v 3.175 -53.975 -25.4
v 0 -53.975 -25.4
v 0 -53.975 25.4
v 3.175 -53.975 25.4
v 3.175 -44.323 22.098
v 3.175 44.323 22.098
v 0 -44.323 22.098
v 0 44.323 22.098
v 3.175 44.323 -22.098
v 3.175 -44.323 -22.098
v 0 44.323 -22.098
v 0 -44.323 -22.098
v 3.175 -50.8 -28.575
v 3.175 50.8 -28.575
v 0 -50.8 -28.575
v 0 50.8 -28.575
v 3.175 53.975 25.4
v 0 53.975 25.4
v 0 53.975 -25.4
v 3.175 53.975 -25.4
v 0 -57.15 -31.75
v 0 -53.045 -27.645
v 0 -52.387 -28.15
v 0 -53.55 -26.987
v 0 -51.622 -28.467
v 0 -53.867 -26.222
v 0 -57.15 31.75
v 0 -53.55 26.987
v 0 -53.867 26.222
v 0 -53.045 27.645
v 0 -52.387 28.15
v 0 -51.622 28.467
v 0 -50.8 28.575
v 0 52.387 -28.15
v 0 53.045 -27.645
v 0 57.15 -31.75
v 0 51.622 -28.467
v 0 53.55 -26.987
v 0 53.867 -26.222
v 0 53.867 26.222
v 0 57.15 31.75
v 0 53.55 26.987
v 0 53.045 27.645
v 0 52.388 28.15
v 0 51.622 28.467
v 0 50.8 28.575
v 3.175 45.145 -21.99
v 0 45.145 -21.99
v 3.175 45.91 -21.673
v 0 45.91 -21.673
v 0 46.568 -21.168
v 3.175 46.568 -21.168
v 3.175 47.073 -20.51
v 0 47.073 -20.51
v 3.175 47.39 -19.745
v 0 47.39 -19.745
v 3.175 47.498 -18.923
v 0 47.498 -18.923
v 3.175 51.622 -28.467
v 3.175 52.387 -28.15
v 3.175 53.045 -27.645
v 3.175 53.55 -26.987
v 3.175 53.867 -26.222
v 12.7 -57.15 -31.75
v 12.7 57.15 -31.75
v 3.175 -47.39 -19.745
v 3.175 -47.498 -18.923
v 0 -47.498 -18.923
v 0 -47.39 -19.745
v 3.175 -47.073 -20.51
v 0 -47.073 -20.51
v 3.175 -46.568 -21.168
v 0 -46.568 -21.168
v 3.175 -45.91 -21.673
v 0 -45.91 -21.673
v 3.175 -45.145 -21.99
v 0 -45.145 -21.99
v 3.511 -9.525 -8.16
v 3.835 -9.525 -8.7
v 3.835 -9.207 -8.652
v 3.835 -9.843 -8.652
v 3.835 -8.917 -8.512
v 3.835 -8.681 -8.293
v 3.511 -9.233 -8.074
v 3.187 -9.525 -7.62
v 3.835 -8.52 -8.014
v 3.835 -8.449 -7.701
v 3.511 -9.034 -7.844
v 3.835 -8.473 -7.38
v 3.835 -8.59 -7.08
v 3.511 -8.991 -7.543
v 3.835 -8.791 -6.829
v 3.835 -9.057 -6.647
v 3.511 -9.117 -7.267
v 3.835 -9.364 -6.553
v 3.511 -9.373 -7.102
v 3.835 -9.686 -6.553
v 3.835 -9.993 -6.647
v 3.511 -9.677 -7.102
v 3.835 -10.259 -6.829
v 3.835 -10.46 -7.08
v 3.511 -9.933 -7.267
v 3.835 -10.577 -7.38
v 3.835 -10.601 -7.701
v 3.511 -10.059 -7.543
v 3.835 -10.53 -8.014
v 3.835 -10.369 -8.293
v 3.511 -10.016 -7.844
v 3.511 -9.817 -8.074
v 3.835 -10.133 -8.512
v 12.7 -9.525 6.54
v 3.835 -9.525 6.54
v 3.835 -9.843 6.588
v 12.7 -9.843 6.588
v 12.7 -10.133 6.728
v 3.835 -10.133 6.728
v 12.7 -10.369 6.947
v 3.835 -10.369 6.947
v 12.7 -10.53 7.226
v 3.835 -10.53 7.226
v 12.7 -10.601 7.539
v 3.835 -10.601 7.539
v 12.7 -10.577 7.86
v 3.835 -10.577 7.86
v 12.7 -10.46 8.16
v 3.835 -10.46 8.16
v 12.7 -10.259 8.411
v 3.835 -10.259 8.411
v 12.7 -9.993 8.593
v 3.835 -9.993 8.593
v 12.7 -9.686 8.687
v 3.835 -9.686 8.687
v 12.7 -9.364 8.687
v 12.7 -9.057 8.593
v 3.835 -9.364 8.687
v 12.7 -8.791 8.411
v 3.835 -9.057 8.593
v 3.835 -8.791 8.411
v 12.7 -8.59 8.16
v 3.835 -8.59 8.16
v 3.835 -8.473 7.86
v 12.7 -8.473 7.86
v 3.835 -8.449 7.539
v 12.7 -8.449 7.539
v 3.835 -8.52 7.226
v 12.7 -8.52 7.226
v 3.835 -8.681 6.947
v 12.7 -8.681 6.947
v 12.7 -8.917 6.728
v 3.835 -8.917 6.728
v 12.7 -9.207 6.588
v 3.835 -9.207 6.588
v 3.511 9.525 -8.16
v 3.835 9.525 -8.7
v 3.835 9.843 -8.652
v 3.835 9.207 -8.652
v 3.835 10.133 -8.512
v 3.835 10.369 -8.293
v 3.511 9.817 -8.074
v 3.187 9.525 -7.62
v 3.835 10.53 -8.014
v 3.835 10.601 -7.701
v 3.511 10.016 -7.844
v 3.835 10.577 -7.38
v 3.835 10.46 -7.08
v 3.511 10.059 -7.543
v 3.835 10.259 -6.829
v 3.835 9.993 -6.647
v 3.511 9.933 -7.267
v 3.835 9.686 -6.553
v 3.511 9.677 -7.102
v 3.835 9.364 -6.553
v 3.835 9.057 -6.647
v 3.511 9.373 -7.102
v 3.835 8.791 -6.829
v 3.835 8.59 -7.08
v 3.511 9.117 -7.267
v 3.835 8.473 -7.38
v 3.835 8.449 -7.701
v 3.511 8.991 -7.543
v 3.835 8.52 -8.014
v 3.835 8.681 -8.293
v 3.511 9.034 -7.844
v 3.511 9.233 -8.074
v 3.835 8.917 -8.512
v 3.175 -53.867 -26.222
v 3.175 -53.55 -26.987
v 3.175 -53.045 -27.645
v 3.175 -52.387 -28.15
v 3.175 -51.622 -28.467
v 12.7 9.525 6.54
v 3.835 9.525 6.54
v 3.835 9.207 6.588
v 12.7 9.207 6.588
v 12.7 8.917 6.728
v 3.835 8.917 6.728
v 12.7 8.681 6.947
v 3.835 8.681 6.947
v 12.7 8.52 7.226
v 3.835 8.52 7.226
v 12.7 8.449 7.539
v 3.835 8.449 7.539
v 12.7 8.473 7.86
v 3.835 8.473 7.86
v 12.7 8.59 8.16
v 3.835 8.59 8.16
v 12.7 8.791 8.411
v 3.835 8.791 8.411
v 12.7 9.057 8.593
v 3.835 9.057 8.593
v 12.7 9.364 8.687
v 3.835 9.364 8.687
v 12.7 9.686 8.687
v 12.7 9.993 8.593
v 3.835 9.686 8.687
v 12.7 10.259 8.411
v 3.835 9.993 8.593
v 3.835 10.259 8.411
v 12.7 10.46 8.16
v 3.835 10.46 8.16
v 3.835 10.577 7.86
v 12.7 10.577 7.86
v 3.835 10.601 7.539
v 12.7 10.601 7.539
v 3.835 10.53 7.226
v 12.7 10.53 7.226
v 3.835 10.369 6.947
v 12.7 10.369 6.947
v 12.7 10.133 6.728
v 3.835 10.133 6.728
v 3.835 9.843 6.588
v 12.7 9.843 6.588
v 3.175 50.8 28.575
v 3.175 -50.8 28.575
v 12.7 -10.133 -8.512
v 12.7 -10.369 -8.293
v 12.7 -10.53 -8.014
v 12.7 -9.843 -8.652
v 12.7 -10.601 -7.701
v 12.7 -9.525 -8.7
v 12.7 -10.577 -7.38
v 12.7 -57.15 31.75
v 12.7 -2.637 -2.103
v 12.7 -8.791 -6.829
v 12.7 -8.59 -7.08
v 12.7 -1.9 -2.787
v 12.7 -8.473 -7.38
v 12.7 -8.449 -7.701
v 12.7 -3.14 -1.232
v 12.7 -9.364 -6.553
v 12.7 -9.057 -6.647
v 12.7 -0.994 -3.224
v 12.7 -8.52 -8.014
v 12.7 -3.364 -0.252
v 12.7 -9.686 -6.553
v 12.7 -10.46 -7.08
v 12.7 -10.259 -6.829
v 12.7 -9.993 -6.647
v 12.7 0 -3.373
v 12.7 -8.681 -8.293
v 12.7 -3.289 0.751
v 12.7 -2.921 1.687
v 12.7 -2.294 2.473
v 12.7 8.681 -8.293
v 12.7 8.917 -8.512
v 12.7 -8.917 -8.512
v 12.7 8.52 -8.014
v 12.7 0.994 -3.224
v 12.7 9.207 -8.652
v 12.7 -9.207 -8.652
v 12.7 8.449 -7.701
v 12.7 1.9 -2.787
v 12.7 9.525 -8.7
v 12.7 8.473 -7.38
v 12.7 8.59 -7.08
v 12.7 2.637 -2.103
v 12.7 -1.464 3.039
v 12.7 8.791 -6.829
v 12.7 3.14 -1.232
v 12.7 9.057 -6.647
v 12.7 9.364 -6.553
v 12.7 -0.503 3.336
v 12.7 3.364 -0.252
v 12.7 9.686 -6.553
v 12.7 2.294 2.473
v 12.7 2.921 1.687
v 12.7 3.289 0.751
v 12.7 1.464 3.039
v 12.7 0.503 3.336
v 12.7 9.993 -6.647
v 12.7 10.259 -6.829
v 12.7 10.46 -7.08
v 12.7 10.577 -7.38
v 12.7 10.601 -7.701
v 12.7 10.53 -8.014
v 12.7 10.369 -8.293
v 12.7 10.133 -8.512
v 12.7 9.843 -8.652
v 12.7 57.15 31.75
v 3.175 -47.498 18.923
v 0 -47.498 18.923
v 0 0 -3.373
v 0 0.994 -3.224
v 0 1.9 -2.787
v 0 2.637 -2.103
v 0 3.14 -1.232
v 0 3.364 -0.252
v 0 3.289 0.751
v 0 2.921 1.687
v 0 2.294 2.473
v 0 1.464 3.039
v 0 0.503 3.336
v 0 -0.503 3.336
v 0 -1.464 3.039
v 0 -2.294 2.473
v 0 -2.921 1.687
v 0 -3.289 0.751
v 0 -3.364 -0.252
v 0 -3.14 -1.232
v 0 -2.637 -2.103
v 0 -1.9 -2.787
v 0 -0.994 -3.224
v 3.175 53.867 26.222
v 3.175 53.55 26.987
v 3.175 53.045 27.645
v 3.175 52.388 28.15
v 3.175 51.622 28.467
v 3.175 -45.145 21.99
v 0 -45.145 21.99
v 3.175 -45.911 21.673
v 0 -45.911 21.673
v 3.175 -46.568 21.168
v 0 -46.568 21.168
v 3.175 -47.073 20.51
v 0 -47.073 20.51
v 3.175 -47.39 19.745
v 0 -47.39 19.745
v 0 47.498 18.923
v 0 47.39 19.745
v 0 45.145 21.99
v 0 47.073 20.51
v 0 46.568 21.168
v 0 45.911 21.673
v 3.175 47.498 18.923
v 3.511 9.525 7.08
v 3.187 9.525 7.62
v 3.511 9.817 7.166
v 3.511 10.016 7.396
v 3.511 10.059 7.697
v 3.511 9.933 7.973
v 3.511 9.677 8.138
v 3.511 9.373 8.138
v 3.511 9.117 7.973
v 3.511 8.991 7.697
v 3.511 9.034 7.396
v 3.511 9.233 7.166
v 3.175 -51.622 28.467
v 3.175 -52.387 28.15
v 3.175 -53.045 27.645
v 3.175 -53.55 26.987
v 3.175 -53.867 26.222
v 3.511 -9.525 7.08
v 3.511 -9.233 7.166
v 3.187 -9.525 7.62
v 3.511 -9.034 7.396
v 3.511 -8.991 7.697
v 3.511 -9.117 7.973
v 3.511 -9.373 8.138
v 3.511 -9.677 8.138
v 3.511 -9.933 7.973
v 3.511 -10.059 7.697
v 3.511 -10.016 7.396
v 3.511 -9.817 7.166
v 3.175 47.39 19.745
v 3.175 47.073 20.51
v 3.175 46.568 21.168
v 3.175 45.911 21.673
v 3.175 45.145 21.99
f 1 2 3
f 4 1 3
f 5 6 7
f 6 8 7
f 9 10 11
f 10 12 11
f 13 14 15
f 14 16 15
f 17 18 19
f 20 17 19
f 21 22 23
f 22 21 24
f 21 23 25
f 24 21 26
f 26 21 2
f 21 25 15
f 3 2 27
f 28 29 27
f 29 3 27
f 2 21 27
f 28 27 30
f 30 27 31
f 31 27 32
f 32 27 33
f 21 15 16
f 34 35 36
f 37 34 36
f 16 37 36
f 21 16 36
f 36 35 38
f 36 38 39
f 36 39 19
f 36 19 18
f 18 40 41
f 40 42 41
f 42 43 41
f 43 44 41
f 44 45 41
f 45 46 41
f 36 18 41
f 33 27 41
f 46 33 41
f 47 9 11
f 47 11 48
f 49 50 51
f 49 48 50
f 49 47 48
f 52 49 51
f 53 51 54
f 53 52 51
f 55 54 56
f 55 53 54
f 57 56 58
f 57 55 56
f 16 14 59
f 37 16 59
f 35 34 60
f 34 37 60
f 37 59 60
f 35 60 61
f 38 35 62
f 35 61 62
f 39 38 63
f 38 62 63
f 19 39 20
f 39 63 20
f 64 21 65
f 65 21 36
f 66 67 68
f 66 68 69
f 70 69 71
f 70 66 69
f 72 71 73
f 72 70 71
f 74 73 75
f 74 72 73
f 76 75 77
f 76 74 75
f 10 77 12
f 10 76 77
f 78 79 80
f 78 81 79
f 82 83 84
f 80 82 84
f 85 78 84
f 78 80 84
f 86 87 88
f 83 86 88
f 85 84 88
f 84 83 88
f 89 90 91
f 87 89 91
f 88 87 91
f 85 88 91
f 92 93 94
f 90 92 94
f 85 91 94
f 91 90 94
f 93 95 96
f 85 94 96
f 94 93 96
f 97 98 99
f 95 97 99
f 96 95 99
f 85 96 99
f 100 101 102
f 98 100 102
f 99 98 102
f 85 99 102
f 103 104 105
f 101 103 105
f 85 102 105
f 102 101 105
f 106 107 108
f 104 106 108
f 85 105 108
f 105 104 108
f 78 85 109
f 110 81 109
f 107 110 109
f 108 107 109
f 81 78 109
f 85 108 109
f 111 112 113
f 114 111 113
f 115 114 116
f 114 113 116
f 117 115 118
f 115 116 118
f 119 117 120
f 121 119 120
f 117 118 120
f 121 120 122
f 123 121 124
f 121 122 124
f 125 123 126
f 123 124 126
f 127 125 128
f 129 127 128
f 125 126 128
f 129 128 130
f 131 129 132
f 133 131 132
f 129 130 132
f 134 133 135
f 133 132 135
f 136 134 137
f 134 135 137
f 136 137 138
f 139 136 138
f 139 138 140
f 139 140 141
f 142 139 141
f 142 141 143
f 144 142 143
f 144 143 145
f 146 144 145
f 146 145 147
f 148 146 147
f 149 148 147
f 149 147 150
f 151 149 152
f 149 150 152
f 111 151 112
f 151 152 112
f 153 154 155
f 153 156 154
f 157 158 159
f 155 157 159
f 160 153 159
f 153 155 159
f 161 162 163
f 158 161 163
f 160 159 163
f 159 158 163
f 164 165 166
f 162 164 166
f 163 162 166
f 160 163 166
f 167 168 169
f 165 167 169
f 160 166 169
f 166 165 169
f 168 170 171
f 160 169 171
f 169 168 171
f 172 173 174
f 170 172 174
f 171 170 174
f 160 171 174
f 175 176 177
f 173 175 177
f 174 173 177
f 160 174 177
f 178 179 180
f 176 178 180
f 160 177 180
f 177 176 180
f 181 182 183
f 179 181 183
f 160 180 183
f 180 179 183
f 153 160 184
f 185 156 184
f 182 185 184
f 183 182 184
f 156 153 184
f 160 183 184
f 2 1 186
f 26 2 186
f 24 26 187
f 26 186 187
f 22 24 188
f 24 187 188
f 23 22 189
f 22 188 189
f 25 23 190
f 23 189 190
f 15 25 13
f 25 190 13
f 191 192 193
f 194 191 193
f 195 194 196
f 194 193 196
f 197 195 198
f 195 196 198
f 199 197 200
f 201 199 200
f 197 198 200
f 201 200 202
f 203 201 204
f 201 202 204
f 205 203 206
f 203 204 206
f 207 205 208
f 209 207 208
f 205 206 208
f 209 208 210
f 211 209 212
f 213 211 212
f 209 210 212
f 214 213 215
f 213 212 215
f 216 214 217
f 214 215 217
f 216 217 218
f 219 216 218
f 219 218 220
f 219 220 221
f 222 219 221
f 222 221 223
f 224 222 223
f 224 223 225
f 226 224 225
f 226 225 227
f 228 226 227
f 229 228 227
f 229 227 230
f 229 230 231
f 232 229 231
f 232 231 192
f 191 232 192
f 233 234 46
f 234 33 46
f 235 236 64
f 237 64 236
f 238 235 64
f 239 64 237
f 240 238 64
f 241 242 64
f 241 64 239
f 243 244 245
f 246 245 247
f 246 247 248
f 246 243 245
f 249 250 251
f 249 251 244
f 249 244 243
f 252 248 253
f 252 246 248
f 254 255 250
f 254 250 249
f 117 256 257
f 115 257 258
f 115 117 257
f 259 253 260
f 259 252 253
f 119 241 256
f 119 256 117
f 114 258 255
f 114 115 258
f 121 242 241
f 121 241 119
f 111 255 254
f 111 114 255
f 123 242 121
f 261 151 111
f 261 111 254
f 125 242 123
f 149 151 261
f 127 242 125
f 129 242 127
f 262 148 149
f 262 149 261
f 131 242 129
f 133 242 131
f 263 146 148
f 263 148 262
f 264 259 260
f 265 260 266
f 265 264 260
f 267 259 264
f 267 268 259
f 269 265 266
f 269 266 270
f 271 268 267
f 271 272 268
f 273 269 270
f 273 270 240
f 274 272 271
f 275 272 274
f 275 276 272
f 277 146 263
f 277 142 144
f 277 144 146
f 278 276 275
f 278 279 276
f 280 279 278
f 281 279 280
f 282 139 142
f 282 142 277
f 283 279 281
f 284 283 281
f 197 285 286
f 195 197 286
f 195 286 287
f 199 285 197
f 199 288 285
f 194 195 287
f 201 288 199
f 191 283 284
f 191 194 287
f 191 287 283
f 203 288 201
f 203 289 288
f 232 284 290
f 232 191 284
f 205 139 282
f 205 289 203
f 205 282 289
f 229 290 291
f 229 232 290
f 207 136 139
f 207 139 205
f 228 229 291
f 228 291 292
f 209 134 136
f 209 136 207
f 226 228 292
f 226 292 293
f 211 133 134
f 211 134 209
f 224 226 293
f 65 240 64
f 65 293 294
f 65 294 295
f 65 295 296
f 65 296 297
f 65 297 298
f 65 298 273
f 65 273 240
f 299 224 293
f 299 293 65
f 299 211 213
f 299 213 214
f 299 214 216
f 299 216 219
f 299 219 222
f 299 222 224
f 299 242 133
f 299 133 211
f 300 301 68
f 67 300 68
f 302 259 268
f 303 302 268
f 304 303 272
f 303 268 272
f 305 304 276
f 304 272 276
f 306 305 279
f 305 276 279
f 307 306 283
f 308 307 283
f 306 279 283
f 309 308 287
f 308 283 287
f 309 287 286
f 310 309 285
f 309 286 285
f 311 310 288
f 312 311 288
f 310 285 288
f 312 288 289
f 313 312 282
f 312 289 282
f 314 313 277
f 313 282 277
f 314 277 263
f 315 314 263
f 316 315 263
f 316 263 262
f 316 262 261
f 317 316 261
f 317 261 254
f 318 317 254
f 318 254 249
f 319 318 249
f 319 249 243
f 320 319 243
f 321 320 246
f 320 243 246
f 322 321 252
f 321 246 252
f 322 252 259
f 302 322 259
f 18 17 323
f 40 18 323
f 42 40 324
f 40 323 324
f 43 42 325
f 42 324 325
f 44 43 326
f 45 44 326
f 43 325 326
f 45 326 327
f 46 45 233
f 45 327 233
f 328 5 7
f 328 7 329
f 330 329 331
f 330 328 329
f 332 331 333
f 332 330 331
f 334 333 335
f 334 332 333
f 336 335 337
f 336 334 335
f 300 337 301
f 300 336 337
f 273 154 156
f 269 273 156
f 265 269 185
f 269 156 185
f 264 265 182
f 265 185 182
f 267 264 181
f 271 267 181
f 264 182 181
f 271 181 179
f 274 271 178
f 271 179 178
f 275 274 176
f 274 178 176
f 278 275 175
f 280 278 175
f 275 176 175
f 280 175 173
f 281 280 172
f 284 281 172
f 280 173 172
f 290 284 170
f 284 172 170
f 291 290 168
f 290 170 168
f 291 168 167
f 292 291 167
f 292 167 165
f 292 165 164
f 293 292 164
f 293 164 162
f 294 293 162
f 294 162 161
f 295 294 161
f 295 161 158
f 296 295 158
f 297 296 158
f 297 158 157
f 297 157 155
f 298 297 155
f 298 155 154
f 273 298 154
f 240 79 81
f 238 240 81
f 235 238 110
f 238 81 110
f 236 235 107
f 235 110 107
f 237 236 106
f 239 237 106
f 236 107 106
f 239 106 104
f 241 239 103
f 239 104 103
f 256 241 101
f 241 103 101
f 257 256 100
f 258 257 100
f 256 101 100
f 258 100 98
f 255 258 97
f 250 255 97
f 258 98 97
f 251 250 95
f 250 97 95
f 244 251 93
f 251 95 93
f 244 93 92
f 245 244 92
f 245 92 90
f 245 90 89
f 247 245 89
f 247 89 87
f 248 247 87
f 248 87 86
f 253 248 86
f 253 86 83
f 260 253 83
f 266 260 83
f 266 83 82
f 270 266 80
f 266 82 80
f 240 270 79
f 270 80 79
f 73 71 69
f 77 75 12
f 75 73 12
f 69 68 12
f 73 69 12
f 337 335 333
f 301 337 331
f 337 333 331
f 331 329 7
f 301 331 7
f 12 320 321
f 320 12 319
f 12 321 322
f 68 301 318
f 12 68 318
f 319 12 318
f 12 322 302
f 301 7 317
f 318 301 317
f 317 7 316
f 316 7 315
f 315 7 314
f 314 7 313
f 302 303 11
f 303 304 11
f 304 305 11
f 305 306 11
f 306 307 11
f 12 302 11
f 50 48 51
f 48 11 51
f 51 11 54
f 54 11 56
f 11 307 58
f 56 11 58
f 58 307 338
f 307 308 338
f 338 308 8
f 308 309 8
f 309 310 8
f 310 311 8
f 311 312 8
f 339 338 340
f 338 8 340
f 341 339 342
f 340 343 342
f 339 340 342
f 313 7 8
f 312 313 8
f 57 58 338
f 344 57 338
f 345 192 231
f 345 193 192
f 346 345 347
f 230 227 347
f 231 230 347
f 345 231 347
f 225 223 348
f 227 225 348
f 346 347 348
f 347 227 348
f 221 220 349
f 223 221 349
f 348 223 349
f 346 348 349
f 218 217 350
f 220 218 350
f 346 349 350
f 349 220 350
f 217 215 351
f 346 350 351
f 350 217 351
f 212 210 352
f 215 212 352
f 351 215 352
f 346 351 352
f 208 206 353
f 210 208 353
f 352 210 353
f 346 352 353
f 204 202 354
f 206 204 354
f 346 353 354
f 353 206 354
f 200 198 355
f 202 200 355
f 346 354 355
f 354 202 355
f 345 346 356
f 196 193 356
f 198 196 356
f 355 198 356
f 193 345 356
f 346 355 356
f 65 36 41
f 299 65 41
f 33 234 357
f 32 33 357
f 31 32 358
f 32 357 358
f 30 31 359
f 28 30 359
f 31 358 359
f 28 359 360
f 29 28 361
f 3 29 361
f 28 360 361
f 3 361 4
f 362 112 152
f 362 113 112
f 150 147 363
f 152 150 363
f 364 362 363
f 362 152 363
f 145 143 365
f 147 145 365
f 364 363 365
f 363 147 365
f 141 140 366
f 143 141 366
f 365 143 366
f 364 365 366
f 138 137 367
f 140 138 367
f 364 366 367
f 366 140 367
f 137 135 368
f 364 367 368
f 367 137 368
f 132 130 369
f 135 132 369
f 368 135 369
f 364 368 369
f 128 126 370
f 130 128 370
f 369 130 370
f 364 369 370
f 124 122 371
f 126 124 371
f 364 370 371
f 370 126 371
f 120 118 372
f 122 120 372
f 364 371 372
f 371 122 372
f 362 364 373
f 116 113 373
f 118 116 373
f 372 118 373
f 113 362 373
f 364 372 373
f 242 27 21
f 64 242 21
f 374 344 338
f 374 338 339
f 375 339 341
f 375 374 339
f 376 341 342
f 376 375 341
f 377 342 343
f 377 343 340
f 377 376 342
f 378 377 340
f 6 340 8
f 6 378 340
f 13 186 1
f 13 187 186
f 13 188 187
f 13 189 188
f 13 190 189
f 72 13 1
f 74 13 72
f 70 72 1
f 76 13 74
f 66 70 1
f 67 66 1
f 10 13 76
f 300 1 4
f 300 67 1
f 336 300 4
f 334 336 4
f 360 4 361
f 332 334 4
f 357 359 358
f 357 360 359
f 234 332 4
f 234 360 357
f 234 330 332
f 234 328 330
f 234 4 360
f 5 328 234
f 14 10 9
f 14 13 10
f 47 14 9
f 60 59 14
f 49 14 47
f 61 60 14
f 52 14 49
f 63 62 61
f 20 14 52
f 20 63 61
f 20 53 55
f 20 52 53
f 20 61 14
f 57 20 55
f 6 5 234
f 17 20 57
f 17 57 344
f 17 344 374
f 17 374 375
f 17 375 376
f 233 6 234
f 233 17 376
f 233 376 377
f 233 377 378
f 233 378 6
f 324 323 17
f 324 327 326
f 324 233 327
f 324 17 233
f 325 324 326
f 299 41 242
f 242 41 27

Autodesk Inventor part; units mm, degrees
ref_plane "YZ Plane" through (0, 0, 0) normal (1, 0, 0) x (0, 1, 0)
ref_plane "XZ Plane" through (0, 0, 0) normal (0, 1, 0) x (-1, 0, 0)
ref_plane "XY Plane" through (0, 0, 0) normal (0, 0, 1) x (1, 0, 0)
sketch "Sketch1" plane through (0, 0, 0) normal (1, 0, 0) x (0, 1, 0)
  line L0 (57.15, 31.75) -> (-57.15, 31.75)
  line L1 (-57.15, 31.75) -> (-57.15, -31.75)
  line L2 (-57.15, -31.75) -> (57.15, -31.75)
  line L3 (57.15, -31.75) -> (57.15, 31.75)
  line L4 (-50.8, 25.4) -> (50.8, 25.4)
  line L5 (50.8, 25.4) -> (50.8, -25.4)
  line L6 (50.8, -25.4) -> (-50.8, -25.4)
  line L7 (-50.8, -25.4) -> (-50.8, 25.4)
  point P0 (0, 0)
  point P1 (0, -31.75)
  point P2 (57.15, 0)
  point P3 (0, 25.4)
  point P4 (-50.8, 0)
  dimension "d0" = 63.5
  dimension "d1" = 114.3
  dimension "d14" = 50.8
  dimension "d15" = 101.6
extrude "Extrusion1" add sketch "Sketch1" along normal blind 12.7 contours L3 L2 L1 L0 | L4 L5 L6 L7
sketch "Sketch2" plane through (12.7, 0, 0) normal (1, 0, 0) x (0, 0, -1)
  line L0 (-7.62, -9.525) -> (7.62, 9.525) construction
  line L1 (-7.62, 9.525) -> (7.62, -9.525) construction
  circle A0 centre (0, 0) radius 3.3734
  dimension "d5" = 19.05
  dimension "d12" = 6.7469
  dimension "d13" = 15.24
sketch "Sketch3" plane through (0, 0, 0) normal (-1, 0, 0) x (0, 0, 1)
  line L0 (-28.575, -53.975) -> (28.575, -53.975)
  line L1 (28.575, -53.975) -> (28.575, 53.975)
  line L2 (28.575, 53.975) -> (-28.575, 53.975)
  line L3 (-28.575, 53.975) -> (-28.575, -53.975)
  line L4 (22.098, 47.498) -> (22.098, -47.498)
  line L5 (22.098, -47.498) -> (-22.098, -47.498)
  line L6 (-22.098, -47.498) -> (-22.098, 47.498)
  line L7 (-22.098, 47.498) -> (22.098, 47.498)
  point P0 (0, 0)
  point P1 (0, -53.975)
  point P2 (-28.575, 0)
  point P3 (0, 0)
  point P4 (28.575, 0)
  point P5 (0, 53.975)
  dimension "d16" = 107.95
  dimension "d17" = 57.15
  dimension "d31" = 6.477
extrude "Extrusion3" cut sketch "Sketch3" against normal blind 3.175
extrude "Extrusion4" cut sketch "Sketch2" against normal through all
hole "Hole1" at (12.7, -9.525, 7.62) at (12.7, 9.525, 7.62) at (12.7, 9.525, -7.62) at (12.7, -9.525, -7.62) direction (-1, 0, 0) diameter 2.159 depth 8.8646 tip angle 118
fillet "Fillet1" radius 3.175 8 edges at (1.5875, 53.975, 28.575) (1.5875, -47.498, 22.098) (1.5875, -47.498, -22.098) (1.5875, -53.975, -28.575) (1.5875, 47.498, -22.098) (1.5875, -53.975, 28.575) (1.5875, 53.975, -28.575) (1.5875, 47.498, 22.098)
properties part number "plate" material "Aluminum 6061"
